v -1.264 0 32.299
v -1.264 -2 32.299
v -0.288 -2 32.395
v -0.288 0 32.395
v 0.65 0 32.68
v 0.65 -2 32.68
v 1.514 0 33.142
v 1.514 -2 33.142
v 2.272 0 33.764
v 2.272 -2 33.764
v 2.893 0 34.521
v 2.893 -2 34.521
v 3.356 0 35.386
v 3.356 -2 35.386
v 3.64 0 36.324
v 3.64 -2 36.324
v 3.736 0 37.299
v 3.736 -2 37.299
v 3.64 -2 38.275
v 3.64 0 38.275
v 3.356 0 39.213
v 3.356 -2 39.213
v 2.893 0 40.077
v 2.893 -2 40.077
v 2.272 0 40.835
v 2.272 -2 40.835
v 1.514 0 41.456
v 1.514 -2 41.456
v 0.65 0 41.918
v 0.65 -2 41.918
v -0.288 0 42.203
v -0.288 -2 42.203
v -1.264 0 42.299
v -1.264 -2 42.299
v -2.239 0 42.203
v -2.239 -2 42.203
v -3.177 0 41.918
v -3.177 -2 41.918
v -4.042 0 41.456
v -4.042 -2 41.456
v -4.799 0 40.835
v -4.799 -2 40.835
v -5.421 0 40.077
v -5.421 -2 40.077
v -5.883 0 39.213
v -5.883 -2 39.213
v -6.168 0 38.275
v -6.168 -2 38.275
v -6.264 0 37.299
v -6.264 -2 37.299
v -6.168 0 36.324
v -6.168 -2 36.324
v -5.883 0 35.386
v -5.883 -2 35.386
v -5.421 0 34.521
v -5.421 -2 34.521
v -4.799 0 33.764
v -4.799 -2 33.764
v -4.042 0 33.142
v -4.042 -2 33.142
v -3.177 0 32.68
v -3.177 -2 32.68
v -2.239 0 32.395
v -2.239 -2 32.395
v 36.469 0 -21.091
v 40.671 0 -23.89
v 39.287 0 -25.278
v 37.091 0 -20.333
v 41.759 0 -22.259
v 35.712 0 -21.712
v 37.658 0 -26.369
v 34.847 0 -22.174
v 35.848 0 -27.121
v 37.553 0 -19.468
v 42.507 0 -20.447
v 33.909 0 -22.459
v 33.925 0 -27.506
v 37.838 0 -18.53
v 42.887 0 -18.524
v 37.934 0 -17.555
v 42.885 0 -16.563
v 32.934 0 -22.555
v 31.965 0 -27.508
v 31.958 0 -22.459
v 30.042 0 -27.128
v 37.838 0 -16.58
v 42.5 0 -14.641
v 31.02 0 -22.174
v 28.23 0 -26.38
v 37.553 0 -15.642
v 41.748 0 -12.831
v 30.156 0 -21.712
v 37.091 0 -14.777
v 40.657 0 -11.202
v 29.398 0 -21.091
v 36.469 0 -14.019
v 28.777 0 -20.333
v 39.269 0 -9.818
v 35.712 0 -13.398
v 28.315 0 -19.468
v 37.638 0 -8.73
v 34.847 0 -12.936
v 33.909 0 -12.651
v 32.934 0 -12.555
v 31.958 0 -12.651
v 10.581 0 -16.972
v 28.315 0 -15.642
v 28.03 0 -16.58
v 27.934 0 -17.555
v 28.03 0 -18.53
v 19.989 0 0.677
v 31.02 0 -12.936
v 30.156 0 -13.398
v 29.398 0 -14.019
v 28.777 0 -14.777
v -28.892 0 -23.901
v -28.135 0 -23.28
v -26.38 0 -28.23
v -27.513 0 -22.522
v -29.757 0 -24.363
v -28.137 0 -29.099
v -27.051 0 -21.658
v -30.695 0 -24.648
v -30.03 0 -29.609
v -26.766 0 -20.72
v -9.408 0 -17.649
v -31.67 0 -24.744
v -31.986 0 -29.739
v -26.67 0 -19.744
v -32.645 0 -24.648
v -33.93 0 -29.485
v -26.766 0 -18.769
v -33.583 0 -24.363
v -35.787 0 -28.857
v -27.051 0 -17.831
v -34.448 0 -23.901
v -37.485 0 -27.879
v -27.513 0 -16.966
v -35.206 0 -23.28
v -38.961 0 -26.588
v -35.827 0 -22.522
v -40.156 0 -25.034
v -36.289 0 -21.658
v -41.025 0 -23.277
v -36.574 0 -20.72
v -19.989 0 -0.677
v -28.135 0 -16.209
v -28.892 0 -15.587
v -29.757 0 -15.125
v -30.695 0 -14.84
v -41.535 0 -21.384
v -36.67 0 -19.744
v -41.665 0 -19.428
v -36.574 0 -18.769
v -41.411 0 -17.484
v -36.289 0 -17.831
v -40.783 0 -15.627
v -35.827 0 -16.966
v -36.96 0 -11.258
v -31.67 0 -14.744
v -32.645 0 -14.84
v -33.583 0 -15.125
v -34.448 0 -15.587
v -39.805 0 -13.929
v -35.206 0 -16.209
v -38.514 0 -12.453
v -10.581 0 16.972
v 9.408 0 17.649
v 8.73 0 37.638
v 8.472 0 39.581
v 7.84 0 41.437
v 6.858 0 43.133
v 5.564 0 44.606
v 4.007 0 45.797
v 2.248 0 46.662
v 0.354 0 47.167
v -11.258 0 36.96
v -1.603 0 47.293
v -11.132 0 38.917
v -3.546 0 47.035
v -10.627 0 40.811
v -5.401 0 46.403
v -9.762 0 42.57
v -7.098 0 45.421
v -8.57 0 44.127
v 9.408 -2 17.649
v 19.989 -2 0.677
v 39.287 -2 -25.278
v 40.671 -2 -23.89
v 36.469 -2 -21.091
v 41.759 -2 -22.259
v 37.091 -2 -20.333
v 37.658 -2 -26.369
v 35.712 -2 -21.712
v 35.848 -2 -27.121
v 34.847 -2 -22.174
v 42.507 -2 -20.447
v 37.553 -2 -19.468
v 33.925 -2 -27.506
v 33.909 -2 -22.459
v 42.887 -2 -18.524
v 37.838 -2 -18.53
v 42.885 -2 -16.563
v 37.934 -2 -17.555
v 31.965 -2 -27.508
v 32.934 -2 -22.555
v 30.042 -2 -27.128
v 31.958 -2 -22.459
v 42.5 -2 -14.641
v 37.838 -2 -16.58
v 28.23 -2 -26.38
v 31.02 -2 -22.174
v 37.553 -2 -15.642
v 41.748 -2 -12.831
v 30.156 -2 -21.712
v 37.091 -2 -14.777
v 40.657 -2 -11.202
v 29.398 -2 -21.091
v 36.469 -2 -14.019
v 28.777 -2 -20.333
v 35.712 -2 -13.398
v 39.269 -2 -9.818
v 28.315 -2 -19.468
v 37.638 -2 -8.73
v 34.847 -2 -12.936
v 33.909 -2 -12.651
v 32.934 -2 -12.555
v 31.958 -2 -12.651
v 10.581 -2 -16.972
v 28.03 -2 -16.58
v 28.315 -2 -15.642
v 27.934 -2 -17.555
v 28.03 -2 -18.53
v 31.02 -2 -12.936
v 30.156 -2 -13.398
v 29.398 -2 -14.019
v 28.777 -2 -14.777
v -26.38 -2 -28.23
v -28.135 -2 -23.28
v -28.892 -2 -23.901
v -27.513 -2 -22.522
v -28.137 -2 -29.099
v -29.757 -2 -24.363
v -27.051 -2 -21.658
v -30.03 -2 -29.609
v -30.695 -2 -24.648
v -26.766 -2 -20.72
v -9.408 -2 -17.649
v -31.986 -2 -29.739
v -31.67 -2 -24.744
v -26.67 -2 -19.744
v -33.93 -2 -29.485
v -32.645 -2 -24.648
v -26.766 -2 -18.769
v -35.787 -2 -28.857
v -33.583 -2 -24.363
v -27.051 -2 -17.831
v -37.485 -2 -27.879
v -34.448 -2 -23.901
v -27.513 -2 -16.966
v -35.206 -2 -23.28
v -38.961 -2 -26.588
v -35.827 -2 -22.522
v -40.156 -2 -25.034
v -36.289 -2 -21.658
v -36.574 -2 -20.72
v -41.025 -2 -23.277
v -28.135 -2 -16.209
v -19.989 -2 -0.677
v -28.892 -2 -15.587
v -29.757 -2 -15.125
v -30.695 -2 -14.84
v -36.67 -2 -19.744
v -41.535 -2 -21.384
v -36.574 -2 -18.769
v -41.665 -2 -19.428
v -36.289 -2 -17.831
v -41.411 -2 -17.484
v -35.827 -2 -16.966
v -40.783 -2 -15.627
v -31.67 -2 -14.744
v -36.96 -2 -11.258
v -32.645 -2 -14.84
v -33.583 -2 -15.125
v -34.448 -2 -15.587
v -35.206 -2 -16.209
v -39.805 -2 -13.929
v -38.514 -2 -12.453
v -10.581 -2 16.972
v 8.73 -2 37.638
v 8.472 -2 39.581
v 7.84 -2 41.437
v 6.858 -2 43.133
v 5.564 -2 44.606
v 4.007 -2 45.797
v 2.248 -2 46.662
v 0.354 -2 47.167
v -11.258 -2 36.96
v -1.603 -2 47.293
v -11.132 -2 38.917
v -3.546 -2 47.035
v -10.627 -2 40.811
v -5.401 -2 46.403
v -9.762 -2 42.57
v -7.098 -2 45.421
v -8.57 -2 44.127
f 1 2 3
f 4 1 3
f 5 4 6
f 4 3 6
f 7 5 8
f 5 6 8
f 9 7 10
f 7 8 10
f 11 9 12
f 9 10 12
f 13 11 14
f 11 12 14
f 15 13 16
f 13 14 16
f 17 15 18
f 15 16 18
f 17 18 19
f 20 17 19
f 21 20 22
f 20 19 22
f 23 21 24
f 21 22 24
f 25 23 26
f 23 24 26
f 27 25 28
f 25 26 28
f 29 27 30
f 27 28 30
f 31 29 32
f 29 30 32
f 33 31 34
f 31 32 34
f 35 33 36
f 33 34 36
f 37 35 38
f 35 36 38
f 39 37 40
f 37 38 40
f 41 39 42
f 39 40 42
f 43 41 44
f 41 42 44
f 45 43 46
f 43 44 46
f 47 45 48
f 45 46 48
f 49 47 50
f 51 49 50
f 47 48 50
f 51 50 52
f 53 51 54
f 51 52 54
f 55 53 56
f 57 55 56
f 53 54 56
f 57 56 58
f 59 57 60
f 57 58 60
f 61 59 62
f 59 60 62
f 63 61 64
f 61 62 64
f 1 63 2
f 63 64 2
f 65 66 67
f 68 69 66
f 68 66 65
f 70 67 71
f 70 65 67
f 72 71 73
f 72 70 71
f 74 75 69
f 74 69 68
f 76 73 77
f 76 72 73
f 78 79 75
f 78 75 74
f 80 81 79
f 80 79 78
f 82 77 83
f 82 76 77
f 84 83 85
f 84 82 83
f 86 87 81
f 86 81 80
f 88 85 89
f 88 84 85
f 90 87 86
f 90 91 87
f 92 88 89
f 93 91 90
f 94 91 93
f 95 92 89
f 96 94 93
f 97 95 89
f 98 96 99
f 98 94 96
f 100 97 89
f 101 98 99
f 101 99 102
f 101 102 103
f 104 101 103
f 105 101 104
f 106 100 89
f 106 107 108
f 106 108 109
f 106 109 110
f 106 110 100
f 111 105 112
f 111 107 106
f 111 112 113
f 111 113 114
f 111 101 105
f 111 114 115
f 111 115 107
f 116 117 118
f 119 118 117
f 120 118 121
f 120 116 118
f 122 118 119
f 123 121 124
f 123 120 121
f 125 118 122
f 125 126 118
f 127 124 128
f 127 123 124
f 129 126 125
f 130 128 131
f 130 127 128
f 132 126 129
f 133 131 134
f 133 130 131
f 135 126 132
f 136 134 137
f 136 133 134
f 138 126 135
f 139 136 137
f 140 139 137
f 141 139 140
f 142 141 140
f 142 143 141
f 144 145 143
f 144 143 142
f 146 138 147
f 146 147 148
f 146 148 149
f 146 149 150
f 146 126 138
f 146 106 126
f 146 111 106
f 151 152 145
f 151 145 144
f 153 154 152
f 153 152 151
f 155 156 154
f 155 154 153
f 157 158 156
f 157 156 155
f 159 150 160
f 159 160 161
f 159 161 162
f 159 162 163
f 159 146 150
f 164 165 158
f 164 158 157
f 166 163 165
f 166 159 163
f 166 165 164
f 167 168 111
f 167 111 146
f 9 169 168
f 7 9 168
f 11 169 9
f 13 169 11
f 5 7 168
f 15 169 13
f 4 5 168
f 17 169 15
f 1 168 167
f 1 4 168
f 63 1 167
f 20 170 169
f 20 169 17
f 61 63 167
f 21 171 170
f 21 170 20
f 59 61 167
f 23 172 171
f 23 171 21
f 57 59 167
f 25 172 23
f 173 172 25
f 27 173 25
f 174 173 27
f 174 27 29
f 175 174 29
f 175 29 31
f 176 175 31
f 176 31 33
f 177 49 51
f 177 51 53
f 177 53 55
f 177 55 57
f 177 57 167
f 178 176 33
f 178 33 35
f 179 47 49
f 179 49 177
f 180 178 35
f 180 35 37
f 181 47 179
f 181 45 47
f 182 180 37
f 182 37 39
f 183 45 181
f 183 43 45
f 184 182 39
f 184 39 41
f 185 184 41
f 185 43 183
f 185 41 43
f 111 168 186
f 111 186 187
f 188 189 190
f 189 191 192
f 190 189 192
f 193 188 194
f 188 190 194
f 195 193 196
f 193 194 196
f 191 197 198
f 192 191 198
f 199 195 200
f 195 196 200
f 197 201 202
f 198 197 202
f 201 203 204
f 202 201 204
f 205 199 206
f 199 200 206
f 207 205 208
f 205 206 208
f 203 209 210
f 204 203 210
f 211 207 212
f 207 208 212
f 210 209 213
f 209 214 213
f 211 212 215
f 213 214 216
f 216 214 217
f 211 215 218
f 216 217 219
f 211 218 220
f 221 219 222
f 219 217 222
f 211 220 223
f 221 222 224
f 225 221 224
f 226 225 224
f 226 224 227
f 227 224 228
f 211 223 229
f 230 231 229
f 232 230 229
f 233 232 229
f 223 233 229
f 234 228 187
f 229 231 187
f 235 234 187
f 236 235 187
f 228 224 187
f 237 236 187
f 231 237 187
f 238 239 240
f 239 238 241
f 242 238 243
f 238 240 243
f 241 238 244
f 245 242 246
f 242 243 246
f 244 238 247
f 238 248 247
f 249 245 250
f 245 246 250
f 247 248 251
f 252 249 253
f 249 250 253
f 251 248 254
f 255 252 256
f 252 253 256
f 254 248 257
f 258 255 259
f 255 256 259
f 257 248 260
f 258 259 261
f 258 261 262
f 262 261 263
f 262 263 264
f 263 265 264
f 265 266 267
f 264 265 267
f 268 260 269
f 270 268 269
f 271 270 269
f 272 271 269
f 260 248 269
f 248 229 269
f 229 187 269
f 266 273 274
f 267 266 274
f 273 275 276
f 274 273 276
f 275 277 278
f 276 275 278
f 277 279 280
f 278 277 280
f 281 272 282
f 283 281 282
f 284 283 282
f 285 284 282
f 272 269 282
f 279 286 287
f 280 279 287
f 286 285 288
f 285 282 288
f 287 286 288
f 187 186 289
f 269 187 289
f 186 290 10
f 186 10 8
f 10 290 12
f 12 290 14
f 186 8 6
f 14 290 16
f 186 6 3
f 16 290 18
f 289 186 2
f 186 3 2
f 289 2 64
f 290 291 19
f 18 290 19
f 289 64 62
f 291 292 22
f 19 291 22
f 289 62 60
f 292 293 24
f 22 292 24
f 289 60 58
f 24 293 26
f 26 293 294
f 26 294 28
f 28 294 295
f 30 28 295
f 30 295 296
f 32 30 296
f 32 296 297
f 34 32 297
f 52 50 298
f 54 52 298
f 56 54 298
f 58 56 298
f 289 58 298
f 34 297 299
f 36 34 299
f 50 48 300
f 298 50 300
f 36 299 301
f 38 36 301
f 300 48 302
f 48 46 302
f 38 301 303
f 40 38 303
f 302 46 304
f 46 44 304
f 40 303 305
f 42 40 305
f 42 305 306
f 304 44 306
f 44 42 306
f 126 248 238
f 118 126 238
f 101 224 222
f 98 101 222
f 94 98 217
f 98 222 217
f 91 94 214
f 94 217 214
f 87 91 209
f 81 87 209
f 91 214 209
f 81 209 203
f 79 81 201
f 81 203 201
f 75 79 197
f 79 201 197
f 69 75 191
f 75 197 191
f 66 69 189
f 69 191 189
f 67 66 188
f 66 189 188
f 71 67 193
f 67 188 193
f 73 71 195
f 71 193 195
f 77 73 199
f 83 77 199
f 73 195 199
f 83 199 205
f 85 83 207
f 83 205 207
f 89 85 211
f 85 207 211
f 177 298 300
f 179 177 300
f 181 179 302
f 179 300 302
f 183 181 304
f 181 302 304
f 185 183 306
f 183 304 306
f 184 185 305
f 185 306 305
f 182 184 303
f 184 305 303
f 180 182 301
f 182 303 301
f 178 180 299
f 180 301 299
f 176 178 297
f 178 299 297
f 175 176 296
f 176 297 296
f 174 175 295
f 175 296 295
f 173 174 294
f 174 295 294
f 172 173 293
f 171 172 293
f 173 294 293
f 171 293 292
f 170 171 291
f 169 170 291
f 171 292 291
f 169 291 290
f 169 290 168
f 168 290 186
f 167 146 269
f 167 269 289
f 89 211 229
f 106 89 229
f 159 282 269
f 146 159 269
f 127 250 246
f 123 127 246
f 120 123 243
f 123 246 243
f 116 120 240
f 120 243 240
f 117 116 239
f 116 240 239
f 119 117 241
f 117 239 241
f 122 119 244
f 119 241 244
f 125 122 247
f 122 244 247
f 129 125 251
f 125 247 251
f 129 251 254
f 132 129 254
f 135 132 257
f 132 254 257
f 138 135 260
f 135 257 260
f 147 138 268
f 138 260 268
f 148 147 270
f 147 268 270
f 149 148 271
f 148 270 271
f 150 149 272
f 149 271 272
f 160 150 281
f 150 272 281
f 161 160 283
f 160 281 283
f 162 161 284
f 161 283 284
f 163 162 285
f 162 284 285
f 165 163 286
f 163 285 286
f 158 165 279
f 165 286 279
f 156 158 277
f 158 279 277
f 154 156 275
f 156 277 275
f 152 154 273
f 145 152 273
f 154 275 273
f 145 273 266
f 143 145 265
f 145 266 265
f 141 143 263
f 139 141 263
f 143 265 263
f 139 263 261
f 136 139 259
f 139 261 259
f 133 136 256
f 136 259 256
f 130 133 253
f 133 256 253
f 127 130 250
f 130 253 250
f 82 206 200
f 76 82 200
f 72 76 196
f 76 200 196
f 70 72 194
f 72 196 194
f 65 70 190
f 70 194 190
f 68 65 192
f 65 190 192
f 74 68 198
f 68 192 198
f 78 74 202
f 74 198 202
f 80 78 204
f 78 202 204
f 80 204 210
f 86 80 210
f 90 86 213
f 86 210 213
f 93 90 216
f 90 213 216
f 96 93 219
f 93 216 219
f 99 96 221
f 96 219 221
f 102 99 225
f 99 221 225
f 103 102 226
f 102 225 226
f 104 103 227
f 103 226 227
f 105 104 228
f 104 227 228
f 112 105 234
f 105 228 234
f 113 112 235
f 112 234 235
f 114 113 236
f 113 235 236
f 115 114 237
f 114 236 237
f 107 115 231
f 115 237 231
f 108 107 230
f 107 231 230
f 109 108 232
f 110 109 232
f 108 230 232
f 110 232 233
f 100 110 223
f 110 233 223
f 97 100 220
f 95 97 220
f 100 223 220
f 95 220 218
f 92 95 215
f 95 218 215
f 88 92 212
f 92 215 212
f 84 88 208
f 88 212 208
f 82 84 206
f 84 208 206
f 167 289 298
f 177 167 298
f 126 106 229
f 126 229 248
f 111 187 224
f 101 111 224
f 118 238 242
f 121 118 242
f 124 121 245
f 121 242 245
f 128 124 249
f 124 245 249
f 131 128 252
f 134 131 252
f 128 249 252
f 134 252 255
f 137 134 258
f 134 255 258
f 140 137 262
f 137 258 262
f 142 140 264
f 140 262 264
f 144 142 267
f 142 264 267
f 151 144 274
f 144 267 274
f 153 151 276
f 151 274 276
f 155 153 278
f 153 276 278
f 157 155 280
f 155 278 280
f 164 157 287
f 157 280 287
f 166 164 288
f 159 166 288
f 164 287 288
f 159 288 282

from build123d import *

# Parameters (mm, degrees)
BASE_FLANGE1_DEPTH = 2
SKETCH9_R          = 5
TAB1_DEPTH         = 2


# Sheet-metal steps are written as plain solids
with BuildPart() as part:
    # Sketch1 → Base-Flange1 (new body)
    with BuildSketch(Plane(origin=(0, 0, 0), x_dir=(1, 0, 0), z_dir=(0, 1, 0))):
        Polygon((10.580822677, 16.971923623), (-9.40770567, 17.649223043), (-19.988528347, 0.67729942), (-10.580822677, -16.971923623), (9.40770567, -17.649223043), (19.988528347, -0.67729942), align=None)
    extrude(amount=-BASE_FLANGE1_DEPTH)

    # Sketch9 → Tab1 (add)
    # profile 1 of 3: a face of its own
    with BuildSketch(Plane.XZ.offset(2)):
        with BuildLine():
            Line((-10.580822677, 16.971923623), (-11.258122097, 36.960451971))
            ThreePointArc((-11.258122097, 36.960451971), (-1.602507633, 47.293365854), (8.73040625, 37.63775139))
            Line((8.73040625, 37.63775139), (9.40770567, 17.649223043))
            Line((9.40770567, 17.649223043), (-10.580822677, 16.971923623))
        make_face()
        with Locations(Location((-1.263857923, 37.299101681, 0), (0, 0, 270))):
            Circle(SKETCH9_R, mode=Mode.SUBTRACT)
    # profile 2 of 3: a face of its own
    with BuildSketch(Plane.XZ.offset(2)):
        with BuildLine():
            Line((19.988528347, 0.67729942), (37.63775139, -8.73040625))
            ThreePointArc((37.63775139, -8.73040625), (41.758510077, -22.258870607), (28.23004572, -26.379629293))
            Line((28.23004572, -26.379629293), (10.580822677, -16.971923623))
            Line((10.580822677, -16.971923623), (19.988528347, 0.67729942))
        make_face()
        with Locations(Location((32.933898555, -17.555017772, 0), (0, 0, 270))):
            Circle(SKETCH9_R, mode=Mode.SUBTRACT)
    # profile 3 of 3: a face of its own
    with BuildSketch(Plane.XZ.offset(2)):
        with BuildLine():
            Line((-9.40770567, -17.649223043), (-26.379629293, -28.23004572))
            ThreePointArc((-26.379629293, -28.23004572), (-40.156002444, -25.034495247), (-36.960451971, -11.258122097))
            Line((-36.960451971, -11.258122097), (-19.988528347, -0.67729942))
            Line((-19.988528347, -0.67729942), (-9.40770567, -17.649223043))
        make_face()
        with Locations(Location((-31.670040632, -19.744083909, 0), (0, 0, 270))):
            Circle(SKETCH9_R, mode=Mode.SUBTRACT)
    extrude(amount=-TAB1_DEPTH)


solid = part.part
